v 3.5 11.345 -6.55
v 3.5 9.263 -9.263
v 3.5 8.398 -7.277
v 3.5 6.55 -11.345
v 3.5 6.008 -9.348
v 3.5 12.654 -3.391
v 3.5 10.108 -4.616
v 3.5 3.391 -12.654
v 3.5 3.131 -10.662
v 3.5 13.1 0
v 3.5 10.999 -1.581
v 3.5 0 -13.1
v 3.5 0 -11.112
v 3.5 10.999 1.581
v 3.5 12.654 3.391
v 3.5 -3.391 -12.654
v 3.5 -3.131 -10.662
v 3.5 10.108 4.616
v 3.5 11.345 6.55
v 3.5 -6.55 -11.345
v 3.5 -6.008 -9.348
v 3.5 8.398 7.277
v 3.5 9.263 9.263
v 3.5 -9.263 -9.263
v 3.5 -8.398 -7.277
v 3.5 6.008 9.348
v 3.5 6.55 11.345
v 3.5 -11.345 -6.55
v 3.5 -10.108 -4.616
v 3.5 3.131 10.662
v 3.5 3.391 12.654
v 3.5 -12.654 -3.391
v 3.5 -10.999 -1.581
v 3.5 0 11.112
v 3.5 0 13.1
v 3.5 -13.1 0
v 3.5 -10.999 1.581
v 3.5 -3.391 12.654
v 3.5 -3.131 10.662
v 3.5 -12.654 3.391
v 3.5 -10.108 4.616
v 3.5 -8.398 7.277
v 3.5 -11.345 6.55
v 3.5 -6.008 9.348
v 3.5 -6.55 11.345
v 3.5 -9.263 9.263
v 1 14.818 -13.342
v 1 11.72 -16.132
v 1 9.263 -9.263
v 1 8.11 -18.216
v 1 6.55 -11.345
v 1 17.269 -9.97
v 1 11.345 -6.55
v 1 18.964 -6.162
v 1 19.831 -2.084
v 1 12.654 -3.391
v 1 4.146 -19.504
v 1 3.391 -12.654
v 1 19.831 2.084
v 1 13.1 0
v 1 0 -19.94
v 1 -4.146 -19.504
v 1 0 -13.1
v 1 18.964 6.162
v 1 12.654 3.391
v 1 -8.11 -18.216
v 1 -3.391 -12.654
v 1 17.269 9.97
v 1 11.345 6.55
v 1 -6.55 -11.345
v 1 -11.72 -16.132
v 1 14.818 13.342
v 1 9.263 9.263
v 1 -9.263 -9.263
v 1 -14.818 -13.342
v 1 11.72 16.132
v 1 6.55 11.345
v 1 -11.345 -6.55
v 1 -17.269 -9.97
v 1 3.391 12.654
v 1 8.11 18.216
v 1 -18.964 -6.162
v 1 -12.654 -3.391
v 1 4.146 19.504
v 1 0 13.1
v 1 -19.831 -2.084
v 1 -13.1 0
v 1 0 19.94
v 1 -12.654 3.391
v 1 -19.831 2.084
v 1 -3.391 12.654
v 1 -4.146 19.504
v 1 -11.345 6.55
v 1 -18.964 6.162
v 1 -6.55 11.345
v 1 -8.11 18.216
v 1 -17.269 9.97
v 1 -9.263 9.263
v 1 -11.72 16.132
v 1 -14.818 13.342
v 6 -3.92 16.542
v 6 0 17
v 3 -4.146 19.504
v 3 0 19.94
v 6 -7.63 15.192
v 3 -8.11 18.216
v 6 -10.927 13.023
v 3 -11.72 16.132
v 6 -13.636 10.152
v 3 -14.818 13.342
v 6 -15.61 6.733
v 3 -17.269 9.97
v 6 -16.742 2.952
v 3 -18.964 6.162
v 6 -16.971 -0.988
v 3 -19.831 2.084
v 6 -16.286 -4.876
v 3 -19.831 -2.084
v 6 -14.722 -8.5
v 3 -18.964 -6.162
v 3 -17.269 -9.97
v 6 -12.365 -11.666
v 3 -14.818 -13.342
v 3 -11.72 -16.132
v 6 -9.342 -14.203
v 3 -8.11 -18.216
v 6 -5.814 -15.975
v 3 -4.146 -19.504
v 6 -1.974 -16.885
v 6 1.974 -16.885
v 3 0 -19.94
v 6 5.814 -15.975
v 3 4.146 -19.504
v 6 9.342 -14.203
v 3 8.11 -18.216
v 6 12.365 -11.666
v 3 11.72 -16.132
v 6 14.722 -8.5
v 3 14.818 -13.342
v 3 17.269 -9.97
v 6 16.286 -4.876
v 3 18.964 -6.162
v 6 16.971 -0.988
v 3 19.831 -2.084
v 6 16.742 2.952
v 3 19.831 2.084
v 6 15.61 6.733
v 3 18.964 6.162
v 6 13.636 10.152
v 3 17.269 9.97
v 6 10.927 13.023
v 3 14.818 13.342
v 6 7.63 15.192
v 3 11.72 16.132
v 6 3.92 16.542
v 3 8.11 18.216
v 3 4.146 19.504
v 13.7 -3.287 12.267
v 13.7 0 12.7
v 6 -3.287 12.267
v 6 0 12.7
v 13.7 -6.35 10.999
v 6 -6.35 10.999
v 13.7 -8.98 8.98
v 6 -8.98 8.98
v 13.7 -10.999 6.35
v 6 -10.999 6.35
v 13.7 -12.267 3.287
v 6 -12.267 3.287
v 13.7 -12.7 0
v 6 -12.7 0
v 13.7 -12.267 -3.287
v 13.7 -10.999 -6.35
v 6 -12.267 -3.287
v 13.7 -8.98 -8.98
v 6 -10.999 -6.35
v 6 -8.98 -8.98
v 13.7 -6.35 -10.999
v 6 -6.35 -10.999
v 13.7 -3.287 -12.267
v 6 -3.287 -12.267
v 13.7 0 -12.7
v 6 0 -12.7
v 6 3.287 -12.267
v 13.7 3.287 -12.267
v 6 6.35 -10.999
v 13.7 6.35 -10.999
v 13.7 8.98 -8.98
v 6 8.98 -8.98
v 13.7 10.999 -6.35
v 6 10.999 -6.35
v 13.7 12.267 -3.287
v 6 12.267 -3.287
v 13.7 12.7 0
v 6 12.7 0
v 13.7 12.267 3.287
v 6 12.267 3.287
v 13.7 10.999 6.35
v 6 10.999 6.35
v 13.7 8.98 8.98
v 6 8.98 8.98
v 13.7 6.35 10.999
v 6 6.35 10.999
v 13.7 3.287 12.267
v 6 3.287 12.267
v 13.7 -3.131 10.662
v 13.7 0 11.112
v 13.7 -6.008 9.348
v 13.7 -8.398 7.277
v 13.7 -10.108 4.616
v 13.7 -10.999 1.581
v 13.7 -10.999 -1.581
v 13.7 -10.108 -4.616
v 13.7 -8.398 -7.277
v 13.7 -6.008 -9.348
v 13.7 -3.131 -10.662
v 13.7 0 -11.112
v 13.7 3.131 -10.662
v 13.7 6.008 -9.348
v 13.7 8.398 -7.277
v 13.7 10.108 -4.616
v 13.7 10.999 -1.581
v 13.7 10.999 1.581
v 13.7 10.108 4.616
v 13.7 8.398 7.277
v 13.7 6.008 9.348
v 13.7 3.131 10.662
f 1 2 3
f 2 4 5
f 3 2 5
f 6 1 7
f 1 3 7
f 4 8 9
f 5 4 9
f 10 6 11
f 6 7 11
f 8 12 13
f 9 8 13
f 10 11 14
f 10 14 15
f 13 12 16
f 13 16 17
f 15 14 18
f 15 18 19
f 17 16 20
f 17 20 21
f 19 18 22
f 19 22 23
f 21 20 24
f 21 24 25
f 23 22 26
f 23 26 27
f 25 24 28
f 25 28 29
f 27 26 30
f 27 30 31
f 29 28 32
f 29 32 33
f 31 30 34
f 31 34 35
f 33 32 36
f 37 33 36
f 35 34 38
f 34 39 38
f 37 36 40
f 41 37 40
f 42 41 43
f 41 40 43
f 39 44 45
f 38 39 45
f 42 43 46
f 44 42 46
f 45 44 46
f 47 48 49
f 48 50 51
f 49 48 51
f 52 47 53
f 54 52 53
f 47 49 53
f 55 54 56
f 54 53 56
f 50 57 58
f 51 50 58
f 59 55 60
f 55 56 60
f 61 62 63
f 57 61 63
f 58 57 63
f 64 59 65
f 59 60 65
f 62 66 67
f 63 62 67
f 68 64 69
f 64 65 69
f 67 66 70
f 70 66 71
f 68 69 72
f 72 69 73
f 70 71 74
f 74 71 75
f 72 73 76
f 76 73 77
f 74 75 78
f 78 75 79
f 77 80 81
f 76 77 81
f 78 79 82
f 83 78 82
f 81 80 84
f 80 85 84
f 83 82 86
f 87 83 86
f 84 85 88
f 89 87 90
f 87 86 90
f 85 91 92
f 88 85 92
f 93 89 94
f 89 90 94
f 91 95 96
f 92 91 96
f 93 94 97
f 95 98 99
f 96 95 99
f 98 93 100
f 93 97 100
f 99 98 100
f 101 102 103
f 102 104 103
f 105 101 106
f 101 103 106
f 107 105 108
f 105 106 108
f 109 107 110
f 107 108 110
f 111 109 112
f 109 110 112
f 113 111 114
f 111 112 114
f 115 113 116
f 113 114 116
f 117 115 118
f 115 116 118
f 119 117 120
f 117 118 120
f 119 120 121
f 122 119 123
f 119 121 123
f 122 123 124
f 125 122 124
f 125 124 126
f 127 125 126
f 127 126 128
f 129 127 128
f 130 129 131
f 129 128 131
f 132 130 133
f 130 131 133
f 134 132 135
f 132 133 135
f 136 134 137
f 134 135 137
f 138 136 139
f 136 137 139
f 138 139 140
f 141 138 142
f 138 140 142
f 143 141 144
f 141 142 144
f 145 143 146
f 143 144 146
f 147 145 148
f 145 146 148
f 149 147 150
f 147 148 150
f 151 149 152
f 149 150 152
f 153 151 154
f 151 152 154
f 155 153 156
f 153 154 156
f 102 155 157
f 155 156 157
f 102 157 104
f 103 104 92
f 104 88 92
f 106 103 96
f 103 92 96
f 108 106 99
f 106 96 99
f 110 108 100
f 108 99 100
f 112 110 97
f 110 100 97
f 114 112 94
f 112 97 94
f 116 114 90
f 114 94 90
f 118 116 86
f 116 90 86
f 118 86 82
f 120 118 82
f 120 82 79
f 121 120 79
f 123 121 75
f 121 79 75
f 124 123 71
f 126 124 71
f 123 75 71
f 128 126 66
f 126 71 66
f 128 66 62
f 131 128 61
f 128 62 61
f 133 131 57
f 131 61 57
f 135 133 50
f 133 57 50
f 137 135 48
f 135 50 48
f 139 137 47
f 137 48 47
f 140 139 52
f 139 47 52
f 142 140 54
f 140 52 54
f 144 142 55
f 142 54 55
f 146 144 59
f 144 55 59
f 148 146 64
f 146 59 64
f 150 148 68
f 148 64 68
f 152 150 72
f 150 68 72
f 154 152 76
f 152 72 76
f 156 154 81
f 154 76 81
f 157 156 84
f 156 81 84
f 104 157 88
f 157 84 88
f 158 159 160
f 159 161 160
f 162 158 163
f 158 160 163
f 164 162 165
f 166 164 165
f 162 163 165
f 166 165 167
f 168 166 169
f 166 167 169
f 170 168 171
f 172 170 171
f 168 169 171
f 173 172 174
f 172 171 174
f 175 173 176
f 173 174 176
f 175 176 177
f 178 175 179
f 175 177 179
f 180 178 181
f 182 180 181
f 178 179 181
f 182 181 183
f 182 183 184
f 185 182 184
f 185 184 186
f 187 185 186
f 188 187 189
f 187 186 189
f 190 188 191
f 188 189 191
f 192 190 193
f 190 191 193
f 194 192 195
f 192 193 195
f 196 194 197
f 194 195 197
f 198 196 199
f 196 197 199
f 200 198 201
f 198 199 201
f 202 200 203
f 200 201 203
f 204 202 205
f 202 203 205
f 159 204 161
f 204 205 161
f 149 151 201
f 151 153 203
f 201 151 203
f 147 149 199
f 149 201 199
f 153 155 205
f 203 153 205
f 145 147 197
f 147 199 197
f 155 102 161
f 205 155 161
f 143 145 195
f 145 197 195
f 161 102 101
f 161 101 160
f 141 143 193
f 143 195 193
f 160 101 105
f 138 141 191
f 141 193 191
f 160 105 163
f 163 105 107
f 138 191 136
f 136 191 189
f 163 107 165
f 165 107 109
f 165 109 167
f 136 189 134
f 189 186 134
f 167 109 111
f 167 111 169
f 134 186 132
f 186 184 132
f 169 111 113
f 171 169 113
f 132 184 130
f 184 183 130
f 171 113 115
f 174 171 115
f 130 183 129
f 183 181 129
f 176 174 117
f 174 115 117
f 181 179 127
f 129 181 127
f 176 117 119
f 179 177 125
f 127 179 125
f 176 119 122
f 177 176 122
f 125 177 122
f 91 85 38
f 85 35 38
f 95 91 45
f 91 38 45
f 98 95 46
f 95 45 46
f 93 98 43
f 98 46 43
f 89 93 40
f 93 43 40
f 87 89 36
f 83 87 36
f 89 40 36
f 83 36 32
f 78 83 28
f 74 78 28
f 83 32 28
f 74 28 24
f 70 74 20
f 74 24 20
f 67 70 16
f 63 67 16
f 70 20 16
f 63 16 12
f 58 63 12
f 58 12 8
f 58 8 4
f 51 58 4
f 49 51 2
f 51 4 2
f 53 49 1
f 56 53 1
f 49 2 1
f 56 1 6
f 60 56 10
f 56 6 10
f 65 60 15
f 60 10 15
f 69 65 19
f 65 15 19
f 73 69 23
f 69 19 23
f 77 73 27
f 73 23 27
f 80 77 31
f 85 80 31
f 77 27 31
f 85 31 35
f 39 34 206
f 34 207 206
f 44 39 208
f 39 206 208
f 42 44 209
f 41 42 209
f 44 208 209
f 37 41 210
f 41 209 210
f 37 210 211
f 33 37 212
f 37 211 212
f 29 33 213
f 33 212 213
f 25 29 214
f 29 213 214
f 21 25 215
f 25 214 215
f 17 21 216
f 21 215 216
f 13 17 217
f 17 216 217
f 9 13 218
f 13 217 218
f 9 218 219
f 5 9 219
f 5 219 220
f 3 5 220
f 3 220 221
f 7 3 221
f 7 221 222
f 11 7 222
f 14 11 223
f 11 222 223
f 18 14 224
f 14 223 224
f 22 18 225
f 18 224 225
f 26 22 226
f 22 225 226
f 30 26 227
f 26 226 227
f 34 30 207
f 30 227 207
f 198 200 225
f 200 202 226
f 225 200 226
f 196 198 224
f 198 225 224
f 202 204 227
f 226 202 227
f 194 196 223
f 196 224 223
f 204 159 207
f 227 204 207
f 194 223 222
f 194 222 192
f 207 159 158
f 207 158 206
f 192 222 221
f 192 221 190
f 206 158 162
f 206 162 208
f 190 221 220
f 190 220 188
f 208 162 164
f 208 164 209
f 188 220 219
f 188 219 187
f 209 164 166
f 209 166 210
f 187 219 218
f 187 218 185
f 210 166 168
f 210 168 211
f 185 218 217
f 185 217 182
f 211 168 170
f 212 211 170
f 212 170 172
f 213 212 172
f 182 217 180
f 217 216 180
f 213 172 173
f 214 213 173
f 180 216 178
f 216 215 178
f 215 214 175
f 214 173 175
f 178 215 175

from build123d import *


with BuildPart() as part:
    # Axial profile (mm) → Full revolution (revolve)
    with BuildSketch(Plane.XY, mode=Mode.PRIVATE) as full_revolution_sk:
        Polygon((3.5, 11.1125), (13.7, 11.1125), (13.7, 12.7), (6, 12.7), (6, 17), (3, 19.94), (1, 19.94), (1, 13.1), (3.5, 13.1), align=None)
    revolve(full_revolution_sk.sketch.rotate(Axis((-110, 0, 0), (1, 0, 0)), 90), axis=Axis((-110, 0, 0), (1, 0, 0)))


solid = part.part
